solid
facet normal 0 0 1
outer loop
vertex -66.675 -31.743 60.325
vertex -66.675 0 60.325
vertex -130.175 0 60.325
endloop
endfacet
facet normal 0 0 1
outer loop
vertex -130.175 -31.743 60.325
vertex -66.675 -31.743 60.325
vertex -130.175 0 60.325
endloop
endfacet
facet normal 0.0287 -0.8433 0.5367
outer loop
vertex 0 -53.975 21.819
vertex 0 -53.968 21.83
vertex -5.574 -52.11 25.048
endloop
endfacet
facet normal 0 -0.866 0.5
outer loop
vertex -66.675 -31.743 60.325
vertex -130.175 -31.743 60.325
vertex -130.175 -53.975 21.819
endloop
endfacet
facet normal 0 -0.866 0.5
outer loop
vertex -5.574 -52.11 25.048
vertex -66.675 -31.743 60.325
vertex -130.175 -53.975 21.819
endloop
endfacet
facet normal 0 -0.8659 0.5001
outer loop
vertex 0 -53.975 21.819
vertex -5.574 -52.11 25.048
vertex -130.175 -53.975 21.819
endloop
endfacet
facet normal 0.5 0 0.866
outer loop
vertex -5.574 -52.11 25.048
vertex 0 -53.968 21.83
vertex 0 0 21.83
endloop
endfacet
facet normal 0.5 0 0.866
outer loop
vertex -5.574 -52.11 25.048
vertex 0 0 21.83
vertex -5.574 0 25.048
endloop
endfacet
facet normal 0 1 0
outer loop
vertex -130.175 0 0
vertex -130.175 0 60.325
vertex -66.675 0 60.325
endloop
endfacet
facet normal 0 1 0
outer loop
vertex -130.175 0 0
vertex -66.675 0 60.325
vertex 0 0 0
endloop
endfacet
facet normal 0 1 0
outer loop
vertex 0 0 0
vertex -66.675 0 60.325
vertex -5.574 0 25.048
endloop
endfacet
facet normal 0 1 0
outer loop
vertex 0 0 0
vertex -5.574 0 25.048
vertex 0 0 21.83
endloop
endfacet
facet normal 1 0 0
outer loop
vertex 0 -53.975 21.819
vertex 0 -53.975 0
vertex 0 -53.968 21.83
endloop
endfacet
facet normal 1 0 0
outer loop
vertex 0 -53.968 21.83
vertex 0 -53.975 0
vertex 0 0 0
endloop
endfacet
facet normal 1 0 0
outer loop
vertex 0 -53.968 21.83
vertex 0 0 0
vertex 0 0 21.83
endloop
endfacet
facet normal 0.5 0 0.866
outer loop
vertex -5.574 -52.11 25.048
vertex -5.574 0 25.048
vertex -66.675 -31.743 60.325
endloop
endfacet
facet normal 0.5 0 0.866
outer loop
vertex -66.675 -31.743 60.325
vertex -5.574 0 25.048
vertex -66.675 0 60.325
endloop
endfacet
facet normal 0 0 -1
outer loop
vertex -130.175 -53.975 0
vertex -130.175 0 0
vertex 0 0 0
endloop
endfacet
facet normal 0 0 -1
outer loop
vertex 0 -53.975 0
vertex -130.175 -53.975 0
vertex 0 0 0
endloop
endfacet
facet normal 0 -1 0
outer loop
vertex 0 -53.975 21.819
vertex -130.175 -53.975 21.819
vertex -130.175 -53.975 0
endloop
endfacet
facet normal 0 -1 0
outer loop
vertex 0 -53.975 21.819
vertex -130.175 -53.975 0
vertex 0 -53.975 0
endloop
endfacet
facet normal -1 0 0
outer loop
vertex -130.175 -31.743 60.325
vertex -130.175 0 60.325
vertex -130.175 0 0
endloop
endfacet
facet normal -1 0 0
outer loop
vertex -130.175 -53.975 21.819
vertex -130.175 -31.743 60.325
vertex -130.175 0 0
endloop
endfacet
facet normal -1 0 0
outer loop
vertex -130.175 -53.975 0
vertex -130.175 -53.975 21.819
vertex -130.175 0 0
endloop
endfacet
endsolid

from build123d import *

# Parameters (mm, degrees)
F1_DEPTH = 53.975
F3_DEPTH = 130.176


with BuildPart() as f1:
    # F0 (on Front) → F1 (new body)
    with BuildSketch(Plane.XZ):
        Polygon((-130.175, 0), (0, 0), (0, 21.8301708018), (-5.5739317977, 25.0482818256), (-66.675, 60.325), (-130.175, 60.325), align=None)
    extrude(amount=F1_DEPTH)

    # F2 (on face) → F3 (cut, through all)
    with BuildSketch(Plane(origin=(-130.175, 0, 0), x_dir=(0, -1, 0), z_dir=(-1, 0, 0))):
        Polygon((31.7433195945, 60.325), (53.975, 21.8186), (53.975, 60.325), align=None)
    extrude(amount=-F3_DEPTH, mode=Mode.SUBTRACT)


solid = f1.part
